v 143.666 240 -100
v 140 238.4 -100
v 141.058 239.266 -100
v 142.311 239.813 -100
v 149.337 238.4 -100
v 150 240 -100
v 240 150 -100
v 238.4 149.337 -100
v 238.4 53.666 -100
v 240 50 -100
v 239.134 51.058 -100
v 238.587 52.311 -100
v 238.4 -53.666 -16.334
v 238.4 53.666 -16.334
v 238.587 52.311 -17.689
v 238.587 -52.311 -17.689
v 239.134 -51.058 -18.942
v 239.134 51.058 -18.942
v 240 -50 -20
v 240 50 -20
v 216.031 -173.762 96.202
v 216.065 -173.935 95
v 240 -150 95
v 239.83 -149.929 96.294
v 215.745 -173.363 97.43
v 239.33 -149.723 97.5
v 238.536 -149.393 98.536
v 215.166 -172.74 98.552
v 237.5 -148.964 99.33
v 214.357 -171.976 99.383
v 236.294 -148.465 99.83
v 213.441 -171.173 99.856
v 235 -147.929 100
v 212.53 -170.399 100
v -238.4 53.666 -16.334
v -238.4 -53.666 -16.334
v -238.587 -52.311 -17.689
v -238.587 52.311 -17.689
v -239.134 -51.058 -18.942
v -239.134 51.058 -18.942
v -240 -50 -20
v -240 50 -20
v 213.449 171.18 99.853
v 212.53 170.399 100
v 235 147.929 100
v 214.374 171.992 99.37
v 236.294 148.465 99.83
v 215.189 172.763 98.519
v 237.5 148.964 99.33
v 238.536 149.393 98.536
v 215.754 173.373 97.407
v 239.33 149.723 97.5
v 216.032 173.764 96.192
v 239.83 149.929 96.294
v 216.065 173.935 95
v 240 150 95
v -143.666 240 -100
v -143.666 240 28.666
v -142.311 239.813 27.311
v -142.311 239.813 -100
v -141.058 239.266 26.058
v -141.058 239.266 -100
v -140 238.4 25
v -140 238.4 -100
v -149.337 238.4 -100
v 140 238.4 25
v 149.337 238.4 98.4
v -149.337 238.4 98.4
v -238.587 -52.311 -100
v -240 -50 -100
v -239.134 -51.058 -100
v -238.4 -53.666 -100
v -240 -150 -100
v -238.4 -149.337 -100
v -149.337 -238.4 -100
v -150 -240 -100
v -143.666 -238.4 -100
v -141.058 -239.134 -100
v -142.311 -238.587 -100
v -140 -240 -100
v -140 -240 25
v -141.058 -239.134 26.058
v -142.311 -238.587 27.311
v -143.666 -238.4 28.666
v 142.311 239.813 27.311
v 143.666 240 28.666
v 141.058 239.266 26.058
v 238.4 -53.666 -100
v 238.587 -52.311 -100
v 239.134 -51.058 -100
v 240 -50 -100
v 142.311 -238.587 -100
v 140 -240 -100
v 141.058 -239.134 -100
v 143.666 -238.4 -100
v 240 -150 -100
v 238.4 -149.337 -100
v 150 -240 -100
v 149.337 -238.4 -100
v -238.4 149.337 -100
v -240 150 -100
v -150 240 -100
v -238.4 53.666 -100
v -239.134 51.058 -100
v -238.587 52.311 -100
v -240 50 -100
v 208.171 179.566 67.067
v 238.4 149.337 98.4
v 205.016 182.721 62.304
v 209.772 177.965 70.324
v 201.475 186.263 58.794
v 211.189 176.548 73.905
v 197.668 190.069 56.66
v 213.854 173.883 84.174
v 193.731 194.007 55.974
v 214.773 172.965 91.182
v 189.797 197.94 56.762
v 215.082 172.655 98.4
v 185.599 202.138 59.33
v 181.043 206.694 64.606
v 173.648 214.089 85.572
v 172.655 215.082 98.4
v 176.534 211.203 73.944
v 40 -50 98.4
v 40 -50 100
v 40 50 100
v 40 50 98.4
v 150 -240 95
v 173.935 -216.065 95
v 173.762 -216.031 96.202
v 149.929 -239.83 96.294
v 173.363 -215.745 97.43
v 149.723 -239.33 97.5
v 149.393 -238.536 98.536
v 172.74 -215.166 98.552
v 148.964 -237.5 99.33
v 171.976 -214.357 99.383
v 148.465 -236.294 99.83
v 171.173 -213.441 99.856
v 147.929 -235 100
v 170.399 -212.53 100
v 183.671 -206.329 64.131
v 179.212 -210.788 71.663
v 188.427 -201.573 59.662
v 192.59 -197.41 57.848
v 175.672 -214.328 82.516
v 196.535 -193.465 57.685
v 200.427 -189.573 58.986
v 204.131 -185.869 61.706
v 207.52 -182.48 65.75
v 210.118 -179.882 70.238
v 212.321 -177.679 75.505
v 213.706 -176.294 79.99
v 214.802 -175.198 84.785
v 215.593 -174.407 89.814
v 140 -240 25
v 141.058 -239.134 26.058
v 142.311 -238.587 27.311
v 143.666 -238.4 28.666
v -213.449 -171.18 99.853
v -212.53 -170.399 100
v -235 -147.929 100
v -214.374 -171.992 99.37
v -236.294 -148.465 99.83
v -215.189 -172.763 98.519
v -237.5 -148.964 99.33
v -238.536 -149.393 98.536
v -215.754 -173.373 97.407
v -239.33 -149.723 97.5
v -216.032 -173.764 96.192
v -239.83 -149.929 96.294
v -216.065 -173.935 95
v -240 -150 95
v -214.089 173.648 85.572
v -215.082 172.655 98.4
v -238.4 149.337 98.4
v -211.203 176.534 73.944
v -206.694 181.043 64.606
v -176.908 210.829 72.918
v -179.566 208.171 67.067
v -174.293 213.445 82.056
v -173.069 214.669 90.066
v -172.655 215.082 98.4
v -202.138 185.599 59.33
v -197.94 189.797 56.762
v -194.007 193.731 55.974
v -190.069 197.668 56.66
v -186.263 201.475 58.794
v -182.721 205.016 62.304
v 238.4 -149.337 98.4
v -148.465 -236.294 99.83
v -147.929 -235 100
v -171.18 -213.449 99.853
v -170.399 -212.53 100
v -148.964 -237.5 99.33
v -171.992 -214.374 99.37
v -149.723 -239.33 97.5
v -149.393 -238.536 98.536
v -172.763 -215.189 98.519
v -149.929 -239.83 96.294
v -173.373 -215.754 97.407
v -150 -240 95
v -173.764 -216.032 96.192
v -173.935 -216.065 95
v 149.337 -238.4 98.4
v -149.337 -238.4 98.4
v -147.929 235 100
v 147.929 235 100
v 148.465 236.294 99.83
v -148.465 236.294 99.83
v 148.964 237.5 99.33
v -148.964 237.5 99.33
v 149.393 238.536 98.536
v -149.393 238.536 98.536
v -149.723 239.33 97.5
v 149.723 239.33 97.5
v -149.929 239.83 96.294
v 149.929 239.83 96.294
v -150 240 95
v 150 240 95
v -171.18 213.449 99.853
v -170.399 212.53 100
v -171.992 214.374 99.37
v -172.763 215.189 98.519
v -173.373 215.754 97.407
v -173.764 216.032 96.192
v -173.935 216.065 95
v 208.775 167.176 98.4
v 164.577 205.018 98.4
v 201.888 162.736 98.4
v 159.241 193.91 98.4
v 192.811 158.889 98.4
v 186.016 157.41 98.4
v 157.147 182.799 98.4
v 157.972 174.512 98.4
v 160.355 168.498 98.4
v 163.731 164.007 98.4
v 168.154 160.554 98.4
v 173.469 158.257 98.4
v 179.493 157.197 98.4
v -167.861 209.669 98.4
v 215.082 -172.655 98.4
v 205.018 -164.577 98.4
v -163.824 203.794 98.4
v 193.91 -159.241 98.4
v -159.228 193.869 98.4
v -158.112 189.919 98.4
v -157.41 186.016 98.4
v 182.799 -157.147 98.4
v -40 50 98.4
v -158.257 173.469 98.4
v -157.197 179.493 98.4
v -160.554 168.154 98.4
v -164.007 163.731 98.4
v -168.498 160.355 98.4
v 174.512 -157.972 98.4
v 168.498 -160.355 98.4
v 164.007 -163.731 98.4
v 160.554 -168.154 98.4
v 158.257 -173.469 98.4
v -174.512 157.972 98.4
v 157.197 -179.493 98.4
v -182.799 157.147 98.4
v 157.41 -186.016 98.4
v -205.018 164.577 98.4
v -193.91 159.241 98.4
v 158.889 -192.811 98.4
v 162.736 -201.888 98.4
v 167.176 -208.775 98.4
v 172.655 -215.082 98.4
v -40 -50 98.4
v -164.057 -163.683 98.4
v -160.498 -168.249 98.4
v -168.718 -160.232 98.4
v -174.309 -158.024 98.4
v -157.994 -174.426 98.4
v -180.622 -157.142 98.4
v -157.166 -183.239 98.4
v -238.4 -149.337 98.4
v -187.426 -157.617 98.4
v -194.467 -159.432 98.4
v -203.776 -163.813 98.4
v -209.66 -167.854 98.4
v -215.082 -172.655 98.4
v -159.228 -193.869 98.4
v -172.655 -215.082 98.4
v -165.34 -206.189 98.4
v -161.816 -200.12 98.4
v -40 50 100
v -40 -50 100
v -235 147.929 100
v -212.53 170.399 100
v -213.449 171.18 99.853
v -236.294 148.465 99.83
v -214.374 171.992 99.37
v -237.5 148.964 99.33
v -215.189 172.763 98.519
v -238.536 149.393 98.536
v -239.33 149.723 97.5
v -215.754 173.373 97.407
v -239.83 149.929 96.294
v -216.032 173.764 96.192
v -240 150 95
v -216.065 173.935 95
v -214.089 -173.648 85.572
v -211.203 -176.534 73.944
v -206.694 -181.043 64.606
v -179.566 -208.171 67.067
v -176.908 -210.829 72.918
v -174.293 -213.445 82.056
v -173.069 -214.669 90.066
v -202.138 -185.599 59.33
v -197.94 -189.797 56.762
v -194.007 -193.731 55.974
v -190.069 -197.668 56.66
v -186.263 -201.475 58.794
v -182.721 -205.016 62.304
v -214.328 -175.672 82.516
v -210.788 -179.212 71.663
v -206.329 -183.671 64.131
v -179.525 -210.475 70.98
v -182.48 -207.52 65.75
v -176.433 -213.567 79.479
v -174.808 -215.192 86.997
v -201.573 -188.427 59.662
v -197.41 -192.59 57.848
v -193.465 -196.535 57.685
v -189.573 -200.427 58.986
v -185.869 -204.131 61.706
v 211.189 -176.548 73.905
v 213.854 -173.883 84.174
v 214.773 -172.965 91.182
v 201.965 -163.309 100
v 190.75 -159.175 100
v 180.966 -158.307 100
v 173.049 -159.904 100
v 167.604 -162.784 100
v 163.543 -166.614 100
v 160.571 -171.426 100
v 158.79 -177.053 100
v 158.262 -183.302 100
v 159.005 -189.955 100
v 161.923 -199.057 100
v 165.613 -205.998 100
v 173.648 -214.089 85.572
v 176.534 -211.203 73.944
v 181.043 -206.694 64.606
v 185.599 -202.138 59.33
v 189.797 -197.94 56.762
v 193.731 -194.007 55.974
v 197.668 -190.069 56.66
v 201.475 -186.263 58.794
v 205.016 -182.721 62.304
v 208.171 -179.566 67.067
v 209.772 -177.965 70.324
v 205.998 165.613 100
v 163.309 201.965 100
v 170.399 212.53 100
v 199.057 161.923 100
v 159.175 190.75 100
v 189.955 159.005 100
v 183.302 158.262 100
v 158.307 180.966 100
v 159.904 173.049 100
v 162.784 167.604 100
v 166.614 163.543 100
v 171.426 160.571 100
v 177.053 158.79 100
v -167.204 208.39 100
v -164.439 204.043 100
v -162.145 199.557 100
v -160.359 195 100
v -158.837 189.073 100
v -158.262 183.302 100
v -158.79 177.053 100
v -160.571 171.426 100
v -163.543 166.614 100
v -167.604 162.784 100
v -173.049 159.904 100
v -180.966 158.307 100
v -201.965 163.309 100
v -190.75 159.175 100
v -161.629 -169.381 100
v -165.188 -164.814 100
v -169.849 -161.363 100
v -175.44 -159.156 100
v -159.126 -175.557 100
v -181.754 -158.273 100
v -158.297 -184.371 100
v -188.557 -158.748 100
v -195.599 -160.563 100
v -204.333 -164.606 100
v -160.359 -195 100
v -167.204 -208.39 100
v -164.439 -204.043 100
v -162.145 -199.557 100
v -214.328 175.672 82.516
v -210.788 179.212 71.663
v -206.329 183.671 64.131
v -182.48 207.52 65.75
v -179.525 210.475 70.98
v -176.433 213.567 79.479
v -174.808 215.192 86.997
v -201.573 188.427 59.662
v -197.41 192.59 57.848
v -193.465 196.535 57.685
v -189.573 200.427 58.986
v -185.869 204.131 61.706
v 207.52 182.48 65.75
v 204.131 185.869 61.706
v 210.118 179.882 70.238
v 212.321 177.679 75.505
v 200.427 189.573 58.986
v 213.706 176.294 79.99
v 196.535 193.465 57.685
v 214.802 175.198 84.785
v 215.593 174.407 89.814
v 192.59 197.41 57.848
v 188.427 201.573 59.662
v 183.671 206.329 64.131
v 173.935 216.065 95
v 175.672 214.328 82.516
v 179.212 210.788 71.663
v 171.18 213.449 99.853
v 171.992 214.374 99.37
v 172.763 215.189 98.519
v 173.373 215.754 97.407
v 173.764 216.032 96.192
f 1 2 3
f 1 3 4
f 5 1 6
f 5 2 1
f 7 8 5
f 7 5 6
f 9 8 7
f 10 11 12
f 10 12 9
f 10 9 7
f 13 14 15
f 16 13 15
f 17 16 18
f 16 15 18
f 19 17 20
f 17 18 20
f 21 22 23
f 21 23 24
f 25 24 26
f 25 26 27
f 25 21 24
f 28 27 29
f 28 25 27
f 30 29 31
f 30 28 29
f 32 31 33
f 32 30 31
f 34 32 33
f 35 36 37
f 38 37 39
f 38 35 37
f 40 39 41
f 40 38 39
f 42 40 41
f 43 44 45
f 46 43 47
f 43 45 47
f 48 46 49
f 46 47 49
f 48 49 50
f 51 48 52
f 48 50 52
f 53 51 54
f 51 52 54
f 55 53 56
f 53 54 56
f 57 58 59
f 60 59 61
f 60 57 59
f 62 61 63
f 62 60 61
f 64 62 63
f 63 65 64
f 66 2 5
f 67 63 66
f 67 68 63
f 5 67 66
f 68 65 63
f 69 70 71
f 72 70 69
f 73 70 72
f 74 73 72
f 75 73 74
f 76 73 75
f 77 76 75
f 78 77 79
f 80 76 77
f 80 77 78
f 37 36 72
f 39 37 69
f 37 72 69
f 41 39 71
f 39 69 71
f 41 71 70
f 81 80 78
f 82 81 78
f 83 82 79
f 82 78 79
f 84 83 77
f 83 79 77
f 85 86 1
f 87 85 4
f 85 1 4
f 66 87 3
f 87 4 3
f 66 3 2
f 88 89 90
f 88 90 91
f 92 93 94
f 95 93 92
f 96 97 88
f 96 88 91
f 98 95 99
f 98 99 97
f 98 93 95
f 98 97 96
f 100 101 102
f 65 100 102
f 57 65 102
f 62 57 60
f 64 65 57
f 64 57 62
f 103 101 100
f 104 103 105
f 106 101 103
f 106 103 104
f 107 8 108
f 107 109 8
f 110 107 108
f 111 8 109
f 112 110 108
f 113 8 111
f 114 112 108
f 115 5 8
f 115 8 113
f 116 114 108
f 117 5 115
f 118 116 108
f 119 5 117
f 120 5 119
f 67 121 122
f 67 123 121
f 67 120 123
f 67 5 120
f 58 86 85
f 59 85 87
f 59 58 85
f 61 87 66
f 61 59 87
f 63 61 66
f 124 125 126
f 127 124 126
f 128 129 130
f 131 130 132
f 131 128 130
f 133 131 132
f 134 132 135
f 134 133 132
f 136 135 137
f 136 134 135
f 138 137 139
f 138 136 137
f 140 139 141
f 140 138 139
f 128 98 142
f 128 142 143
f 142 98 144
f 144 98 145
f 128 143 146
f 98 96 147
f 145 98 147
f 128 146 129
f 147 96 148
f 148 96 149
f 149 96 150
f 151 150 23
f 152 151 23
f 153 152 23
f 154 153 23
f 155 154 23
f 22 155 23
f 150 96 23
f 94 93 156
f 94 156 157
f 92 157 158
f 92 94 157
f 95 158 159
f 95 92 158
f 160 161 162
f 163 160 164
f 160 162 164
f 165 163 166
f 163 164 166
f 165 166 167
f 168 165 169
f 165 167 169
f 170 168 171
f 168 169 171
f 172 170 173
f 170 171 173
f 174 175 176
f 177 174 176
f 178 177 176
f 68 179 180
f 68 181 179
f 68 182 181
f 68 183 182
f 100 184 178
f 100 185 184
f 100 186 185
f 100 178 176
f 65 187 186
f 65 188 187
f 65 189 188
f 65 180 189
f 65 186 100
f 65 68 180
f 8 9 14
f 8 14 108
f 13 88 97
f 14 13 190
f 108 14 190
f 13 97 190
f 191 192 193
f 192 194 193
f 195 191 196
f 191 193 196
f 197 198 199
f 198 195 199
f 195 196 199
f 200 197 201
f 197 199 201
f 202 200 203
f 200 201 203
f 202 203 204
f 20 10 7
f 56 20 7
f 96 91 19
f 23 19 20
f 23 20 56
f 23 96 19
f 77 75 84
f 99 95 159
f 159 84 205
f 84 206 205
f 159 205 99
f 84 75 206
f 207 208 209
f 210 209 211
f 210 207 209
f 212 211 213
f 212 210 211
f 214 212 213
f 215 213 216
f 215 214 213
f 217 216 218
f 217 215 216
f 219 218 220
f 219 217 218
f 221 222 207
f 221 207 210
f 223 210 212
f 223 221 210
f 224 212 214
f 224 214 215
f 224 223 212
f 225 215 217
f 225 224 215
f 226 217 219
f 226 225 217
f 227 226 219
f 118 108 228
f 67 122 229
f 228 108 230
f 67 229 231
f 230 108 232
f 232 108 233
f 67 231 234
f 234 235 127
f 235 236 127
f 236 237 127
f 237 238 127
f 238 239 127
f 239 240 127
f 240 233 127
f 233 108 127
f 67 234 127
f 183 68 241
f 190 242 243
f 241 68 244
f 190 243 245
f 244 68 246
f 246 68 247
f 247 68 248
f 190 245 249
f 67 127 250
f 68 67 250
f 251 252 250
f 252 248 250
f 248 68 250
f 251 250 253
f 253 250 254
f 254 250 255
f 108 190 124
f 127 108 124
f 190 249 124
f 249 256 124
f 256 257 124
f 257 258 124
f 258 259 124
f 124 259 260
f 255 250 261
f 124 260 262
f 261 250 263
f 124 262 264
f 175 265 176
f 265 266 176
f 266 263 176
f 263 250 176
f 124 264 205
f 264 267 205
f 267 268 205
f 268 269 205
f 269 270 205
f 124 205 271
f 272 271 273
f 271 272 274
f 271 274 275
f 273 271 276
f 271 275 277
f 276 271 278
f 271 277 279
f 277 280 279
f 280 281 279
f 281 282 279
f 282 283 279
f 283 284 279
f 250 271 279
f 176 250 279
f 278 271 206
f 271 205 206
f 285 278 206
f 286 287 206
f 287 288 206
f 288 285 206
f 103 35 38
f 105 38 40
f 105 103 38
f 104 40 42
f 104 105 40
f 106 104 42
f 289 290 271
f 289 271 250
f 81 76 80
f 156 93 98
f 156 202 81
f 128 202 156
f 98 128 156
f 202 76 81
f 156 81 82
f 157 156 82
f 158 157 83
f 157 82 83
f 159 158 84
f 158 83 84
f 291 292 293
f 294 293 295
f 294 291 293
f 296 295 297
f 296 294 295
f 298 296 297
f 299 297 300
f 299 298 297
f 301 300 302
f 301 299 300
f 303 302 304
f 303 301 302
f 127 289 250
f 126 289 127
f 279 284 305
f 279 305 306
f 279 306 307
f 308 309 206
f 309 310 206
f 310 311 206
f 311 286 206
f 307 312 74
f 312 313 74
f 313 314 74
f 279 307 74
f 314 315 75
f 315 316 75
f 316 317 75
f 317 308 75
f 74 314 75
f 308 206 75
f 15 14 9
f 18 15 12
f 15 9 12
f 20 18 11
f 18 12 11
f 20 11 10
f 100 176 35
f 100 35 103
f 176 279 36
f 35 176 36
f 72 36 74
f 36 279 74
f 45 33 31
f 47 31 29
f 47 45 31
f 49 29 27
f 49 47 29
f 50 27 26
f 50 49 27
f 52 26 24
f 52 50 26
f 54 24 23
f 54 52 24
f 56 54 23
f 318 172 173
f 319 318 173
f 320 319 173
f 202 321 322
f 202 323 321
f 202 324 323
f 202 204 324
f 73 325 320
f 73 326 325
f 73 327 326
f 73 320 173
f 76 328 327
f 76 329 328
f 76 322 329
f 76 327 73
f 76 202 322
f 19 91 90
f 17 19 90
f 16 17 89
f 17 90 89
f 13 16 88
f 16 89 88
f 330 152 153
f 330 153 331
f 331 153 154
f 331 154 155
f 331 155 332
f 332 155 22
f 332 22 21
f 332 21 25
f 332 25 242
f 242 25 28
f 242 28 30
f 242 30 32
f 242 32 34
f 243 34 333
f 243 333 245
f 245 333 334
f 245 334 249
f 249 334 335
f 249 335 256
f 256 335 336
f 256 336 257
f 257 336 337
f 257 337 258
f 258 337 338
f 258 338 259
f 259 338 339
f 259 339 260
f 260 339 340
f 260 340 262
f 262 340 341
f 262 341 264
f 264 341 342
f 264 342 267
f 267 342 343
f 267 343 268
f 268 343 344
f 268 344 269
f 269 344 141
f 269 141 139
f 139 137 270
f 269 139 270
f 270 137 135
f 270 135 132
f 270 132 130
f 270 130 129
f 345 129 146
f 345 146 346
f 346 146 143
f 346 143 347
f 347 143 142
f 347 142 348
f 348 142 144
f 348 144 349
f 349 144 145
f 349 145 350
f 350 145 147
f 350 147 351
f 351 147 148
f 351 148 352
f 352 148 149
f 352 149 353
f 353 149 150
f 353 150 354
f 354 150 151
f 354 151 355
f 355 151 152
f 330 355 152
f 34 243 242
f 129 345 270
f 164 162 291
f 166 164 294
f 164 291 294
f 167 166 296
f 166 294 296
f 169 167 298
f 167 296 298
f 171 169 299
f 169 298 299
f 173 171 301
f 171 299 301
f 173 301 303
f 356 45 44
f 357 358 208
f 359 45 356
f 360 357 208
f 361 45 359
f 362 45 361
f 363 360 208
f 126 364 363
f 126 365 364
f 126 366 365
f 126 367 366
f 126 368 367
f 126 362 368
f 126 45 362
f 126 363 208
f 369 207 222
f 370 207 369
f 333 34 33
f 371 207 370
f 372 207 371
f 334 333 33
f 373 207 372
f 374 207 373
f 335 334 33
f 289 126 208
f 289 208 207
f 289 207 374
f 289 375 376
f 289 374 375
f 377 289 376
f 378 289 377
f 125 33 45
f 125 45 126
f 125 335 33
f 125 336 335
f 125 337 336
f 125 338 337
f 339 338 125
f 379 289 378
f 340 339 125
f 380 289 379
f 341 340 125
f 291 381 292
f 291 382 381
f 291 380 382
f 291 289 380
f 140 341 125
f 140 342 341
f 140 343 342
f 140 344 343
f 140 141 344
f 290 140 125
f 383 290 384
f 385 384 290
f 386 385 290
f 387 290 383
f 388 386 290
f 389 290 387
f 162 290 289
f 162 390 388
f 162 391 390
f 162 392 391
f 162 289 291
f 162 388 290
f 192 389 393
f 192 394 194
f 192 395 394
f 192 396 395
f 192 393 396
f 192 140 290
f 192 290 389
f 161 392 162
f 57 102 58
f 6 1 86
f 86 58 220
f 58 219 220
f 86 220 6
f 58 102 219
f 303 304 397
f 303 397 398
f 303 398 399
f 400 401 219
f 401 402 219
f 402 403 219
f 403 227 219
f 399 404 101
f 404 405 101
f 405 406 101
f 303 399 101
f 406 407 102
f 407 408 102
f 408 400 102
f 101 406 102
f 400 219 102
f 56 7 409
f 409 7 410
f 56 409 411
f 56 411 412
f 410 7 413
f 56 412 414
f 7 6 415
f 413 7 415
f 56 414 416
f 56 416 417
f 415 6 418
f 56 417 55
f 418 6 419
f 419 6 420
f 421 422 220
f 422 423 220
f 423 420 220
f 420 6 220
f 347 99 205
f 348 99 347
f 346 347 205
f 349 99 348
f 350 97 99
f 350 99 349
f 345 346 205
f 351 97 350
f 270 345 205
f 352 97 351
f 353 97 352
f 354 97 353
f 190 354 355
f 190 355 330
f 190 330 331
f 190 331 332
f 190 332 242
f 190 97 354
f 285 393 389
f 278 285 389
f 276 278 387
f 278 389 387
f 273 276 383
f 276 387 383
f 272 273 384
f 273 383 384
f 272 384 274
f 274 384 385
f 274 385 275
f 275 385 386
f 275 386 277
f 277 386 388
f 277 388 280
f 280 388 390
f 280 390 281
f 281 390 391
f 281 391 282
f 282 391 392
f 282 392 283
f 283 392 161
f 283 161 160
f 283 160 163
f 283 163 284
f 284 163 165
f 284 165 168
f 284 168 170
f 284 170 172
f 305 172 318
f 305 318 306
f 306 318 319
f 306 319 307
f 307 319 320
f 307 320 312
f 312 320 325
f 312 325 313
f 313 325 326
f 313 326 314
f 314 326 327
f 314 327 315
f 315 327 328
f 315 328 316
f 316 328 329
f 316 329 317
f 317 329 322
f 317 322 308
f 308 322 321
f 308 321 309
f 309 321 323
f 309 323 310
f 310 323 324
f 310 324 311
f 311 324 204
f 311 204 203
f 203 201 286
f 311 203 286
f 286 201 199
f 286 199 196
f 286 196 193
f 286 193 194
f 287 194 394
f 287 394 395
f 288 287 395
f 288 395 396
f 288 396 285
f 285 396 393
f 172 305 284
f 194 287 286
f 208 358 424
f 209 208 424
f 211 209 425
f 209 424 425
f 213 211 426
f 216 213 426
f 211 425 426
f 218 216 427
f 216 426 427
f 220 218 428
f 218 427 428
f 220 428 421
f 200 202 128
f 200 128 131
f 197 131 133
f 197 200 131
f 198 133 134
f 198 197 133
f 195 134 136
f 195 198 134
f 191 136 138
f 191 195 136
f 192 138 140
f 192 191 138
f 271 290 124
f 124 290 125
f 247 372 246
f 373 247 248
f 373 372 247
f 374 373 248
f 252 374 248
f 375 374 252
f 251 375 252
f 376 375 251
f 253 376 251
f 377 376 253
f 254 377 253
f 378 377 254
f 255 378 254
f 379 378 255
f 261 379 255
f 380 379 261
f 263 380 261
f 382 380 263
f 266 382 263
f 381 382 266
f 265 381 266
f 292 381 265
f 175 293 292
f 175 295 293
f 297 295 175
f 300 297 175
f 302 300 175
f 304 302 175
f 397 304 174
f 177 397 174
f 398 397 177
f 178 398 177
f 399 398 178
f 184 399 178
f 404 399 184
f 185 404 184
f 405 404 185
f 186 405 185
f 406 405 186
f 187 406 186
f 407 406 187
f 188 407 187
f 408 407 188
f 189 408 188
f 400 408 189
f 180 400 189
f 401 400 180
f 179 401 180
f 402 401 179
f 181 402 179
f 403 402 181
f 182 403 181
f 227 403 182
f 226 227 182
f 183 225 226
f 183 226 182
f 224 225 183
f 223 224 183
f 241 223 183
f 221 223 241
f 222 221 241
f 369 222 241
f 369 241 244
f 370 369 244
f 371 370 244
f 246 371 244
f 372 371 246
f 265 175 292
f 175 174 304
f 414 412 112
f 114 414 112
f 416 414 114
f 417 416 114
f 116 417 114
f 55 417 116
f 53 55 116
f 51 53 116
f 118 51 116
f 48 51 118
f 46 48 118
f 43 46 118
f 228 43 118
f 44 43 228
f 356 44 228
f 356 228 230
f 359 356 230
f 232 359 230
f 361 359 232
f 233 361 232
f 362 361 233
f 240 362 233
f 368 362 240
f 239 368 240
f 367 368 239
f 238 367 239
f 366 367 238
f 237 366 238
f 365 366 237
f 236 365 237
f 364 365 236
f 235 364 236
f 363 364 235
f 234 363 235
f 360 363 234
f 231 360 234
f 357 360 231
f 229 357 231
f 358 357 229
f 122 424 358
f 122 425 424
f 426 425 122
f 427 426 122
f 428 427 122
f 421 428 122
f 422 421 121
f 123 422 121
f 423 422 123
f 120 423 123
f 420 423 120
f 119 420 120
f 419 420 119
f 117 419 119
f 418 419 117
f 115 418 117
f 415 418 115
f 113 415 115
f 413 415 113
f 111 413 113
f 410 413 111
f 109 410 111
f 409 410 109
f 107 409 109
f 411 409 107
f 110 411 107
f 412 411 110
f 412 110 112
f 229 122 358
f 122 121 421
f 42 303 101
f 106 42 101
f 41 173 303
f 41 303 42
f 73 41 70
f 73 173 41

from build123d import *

# Parameters (mm, degrees)
F1_DEPTH       = 240
F2_SIZE        = 90
F3_T           = -1.6
F10_R          = 30
F12_DEPTH      = 78
F11_R          = 30
F13_DEPTH      = 82
F8_R           = 30
F14_DEPTH      = 153
F9_R           = 30
F15_DEPTH      = 141
F17_DEPTH      = 688
F18_W          = 80
F18_H          = 100
F19_DEPTH      = 25
F20_T1_DEPTH   = 325
F20_T3_DEPTH   = 58.6396103068
F20_T5_DEPTH   = 58.6396103068
F20_T7_DEPTH   = 58.6396103068
F20_T9_DEPTH   = 58.6396103068
F20_T11_DEPTH  = 325
F20_T13_DEPTH  = 58.6396103068
F20_T15_DEPTH  = 58.6396103068
F20_T17_DEPTH  = 134.1651513899
F20_T19_DEPTH  = 280
F20_T21_DEPTH  = 89.1651513899
F20_T23_DEPTH  = 100
F20_T29_DEPTH  = 134.1651513899
F20_T33_DEPTH  = 289.1651513899
F20_T40_DEPTH  = 289.1651513899
F20_T44_DEPTH  = 134.1651513899
F20_T51_DEPTH  = 89.1651513899
F20_T55_DEPTH  = 109.1651513899
F20_T62_DEPTH  = 109.1651513899
F20_T66_DEPTH  = 89.1651513899
F20_T73_DEPTH  = 89.1651513899
F20_T77_DEPTH  = 109.1651513899
F20_T84_DEPTH  = 89.1651513899
F20_T88_DEPTH  = 109.1651513899
F20_T95_DEPTH  = 289.1651513899
F20_T99_DEPTH  = 134.1651513899
F20_T106_DEPTH = 134.1651513899
F20_T110_DEPTH = 289.1651513899


# Not quite as in the source:
# - a fillet or chamfer that OpenCascade refuses, or shapes differently, is made with other operations: its cross-section is extruded or revolved along the edge and cut away or added


with BuildPart() as f1:
    # F0 (on Front) → F1 (new body, symmetric)
    with BuildSketch(Plane.XZ):
        Polygon((140, -100), (240, -100), (240, 100), (-240, 100), (-240, -100), (-140, -100), (-140, 25), (140, 25), align=None)
    extrude(amount=F1_DEPTH, both=True)

    # F2
    f2_edges = [f1.edges().sort_by_distance(p)[0] for p in [
        (240, -240, 0),
        (240, 240, 0),
        (-240, 240, 0),
        (-240, -240, 0),
    ]]
    chamfer(f2_edges, length=F2_SIZE)

    # F3
    f3_openings = [f1.faces().sort_by_distance(p)[0] for p in [
        (185.93985, 0, -100),
        (-185.93985, 0, -100),
        (0, 0, 25),
        (140, 0, -37.5),
        (-140, 0, -37.5),
    ]]
    offset(amount=F3_T, openings=f3_openings)

    # F10 (on face) → F12 (cut)
    with BuildSketch(Plane(origin=(-132.8553390593, 132.8553390593, 187.8858223314), x_dir=(0.8660254038, 0.2886751346, 0.4082482905), z_dir=(0.5, -0.5, -0.7071067812))):
        with Locations((-71.7584734456, -101.4818063619)):
            Circle(F10_R)
    extrude(amount=F12_DEPTH, mode=Mode.SUBTRACT)

    # F11 (on face) → F13 (cut)
    with BuildSketch(Plane(origin=(-132.8553390593, -132.8553390593, 187.8858223314), x_dir=(0.8660254038, -0.2886751346, 0.4082482905), z_dir=(-0.5, -0.5, 0.7071067812))):
        with Locations((-71.7584734456, -101.4818063619)):
            Circle(F11_R)
    extrude(amount=-F13_DEPTH, mode=Mode.SUBTRACT)

    # F8 (on face) → F14 (cut)
    with BuildSketch(Plane(origin=(132.8553390593, -132.8553390593, 187.8858223314), x_dir=(0.8660254038, 0.2886751346, -0.4082482905), z_dir=(0.5, -0.5, 0.7071067812))):
        with Locations((71.7584734456, -101.4818063619)):
            Circle(F8_R)
    extrude(amount=-F14_DEPTH, mode=Mode.SUBTRACT)

    # F9 (on face) → F15 (cut)
    with BuildSketch(Plane(origin=(132.8553390593, 132.8553390593, 187.8858223314), x_dir=(0.8660254038, -0.2886751346, -0.4082482905), z_dir=(-0.5, -0.5, -0.7071067812))):
        with Locations((71.7584734456, -101.4818063619)):
            Circle(F9_R)
    extrude(amount=F15_DEPTH, mode=Mode.SUBTRACT)

    # F16 (on face) → F17 (cut)
    with BuildSketch(Plane(origin=(-240, 0, 0), x_dir=(0, -1, 0), z_dir=(-1, 0, 0))):
        Polygon((-50, -20), (-50, -100), (0, -100), (50, -100), (50, -20), align=None)
    extrude(amount=-F17_DEPTH, mode=Mode.SUBTRACT)

    # F18 (on face) → F19 (cut)
    with BuildSketch(Plane.XY.offset(100)):
        Rectangle(F18_W, F18_H)
    extrude(amount=-F19_DEPTH, mode=Mode.SUBTRACT)

    # F20: fillet of radius 5 on 24 edges, made by hand

    # F20_s2 → F20_t1 (cut)
    with BuildSketch(Plane.YZ.offset(-162.5)):
        with BuildLine():
            ThreePointArc((235, 100), (238.5355339059, 98.5355339059), (240, 95))
            Line((240, 95), (240, 100))
            Line((240, 100), (235, 100))
        make_face()
        with BuildLine():
            ThreePointArc((-240, 95), (-238.5355339059, 98.5355339059), (-235, 100))
            Line((-235, 100), (-240, 100))
            Line((-240, 100), (-240, 95))
        make_face()
    extrude(amount=F20_T1_DEPTH, mode=Mode.SUBTRACT)

    # F20_s4 → F20_t3 (cut)
    with BuildSketch(Plane(origin=(12.3743686708, 12.3743686708, 0), x_dir=(0, 0, 1), z_dir=(0.7071067812, 0.7071067812, 0))):
        with BuildLine():
            ThreePointArc((100, -270.7716446628), (98.5355339059, -274.3071785687), (95, -275.7716446628))
            Line((95, -275.7716446628), (100, -275.7716446628))
            Line((100, -275.7716446628), (100, -270.7716446628))
        make_face()
        with BuildLine():
            ThreePointArc((95, 275.7716446628), (98.5355339059, 274.3071785687), (100, 270.7716446628))
            Line((100, 270.7716446628), (100, 275.7716446628))
            Line((100, 275.7716446628), (95, 275.7716446628))
        make_face()
    extrude(amount=F20_T3_DEPTH, mode=Mode.SUBTRACT)

    # F20_s6 → F20_t5 (cut)
    with BuildSketch(Plane(origin=(-12.3743686708, 12.3743686708, 0), x_dir=(0, 0, 1), z_dir=(-0.7071067812, 0.7071067812, 0))):
        with BuildLine():
            ThreePointArc((100, 270.7716446628), (98.5355339059, 274.3071785687), (95, 275.7716446628))
            Line((95, 275.7716446628), (100, 275.7716446628))
            Line((100, 275.7716446628), (100, 270.7716446628))
        make_face()
    extrude(amount=F20_T5_DEPTH, mode=Mode.SUBTRACT)

    # F20_s8 → F20_t7 (cut)
    with BuildSketch(Plane(origin=(53.8388347648, -53.8388347648, 0), x_dir=(0, 0, 1), z_dir=(-0.7071067812, 0.7071067812, 0))):
        with BuildLine():
            ThreePointArc((100, 270.7716446628), (98.5355339059, 274.3071785687), (95, 275.7716446628))
            Line((95, 275.7716446628), (100, 275.7716446628))
            Line((100, 275.7716446628), (100, 270.7716446628))
        make_face()
    extrude(amount=F20_T7_DEPTH, mode=Mode.SUBTRACT)

    # F20_s10 → F20_t9 (cut)
    with BuildSketch(Plane(origin=(-53.8388347648, -53.8388347648, 0), x_dir=(0, 0, 1), z_dir=(0.7071067812, 0.7071067812, 0))):
        with BuildLine():
            ThreePointArc((100, -270.7716446628), (98.5355339059, -274.3071785687), (95, -275.7716446628))
            Line((95, -275.7716446628), (100, -275.7716446628))
            Line((100, -275.7716446628), (100, -270.7716446628))
        make_face()
        with BuildLine():
            ThreePointArc((95, 275.7716446628), (98.5355339059, 274.3071785687), (100, 270.7716446628))
            Line((100, 270.7716446628), (100, 275.7716446628))
            Line((100, 275.7716446628), (95, 275.7716446628))
        make_face()
    extrude(amount=F20_T9_DEPTH, mode=Mode.SUBTRACT)

    # F20_s12 → F20_t11 (cut)
    with BuildSketch(Plane.XZ.offset(-162.5)):
        with BuildLine():
            ThreePointArc((-235, 100), (-238.5355339059, 98.5355339059), (-240, 95))
            Line((-240, 95), (-240, 100))
            Line((-240, 100), (-235, 100))
        make_face()
        with BuildLine():
            ThreePointArc((235, 100), (238.5355339059, 98.5355339059), (240, 95))
            Line((240, 95), (240, 100))
            Line((240, 100), (235, 100))
        make_face()
    extrude(amount=F20_T11_DEPTH, mode=Mode.SUBTRACT)

    # F20_s14 → F20_t13 (cut)
    with BuildSketch(Plane(origin=(-53.8388347648, 53.8388347648, 0), x_dir=(0, 0, 1), z_dir=(0.7071067812, -0.7071067812, 0))):
        with BuildLine():
            ThreePointArc((100, 270.7716446628), (98.5355339059, 274.3071785687), (95, 275.7716446628))
            Line((95, 275.7716446628), (100, 275.7716446628))
            Line((100, 275.7716446628), (100, 270.7716446628))
        make_face()
    extrude(amount=F20_T13_DEPTH, mode=Mode.SUBTRACT)

    # F20_s16 → F20_t15 (cut)
    with BuildSketch(Plane(origin=(12.3743686708, -12.3743686708, 0), x_dir=(0, 0, 1), z_dir=(0.7071067812, -0.7071067812, 0))):
        with BuildLine():
            ThreePointArc((100, 270.7716446628), (98.5355339059, 274.3071785687), (95, 275.7716446628))
            Line((95, 275.7716446628), (100, 275.7716446628))
            Line((100, 275.7716446628), (100, 270.7716446628))
        make_face()
    extrude(amount=F20_T15_DEPTH, mode=Mode.SUBTRACT)

    # F20_s18 → F20_t17 (cut)
    with BuildSketch(Plane.XY.offset(-109.1651513899)):
        with BuildLine():
            ThreePointArc((140, -240), (141.666060556, -238.817424305), (143.666060556, -238.4))
            Line((143.666060556, -238.4), (140, -238.4))
            Line((140, -238.4), (140, -240))
        make_face()
        with BuildLine():
            ThreePointArc((-140, -240), (-141.666060556, -238.817424305), (-143.666060556, -238.4))
            Line((-143.666060556, -238.4), (-140, -238.4))
            Line((-140, -238.4), (-140, -240))
        make_face()
        with BuildLine():
            ThreePointArc((143.666060556, 240), (141.666060556, 239.582575695), (140, 238.4))
            Line((140, 238.4), (140, 240))
            Line((140, 240), (143.666060556, 240))
        make_face()
        with BuildLine():
            ThreePointArc((-143.666060556, 240), (-141.666060556, 239.582575695), (-140, 238.4))
            Line((-140, 238.4), (-140, 240))
            Line((-140, 240), (-143.666060556, 240))
        make_face()
    extrude(amount=F20_T17_DEPTH, mode=Mode.SUBTRACT)

    # F20_s20 → F20_t19 (cut)
    with BuildSketch(Plane.YZ.offset(-140)):
        with BuildLine():
            ThreePointArc((-240, 25), (-238.817424305, 26.666060556), (-238.4, 28.666060556))
            Line((-238.4, 28.666060556), (-238.4, 25))
            Line((-238.4, 25), (-240, 25))
        make_face()
        with BuildLine():
            ThreePointArc((240, 28.666060556), (239.582575695, 26.666060556), (238.4, 25))
            Line((238.4, 25), (240, 25))
            Line((240, 25), (240, 28.666060556))
        make_face()
    extrude(amount=F20_T19_DEPTH, mode=Mode.SUBTRACT)

    # F20_s22 → F20_t21 (cut)
    with BuildSketch(Plane.XY.offset(-109.1651513899)):
        with BuildLine():
            ThreePointArc((-238.4, -53.666060556), (-238.817424305, -51.666060556), (-240, -50))
            Line((-240, -50), (-238.4, -50))
            Line((-238.4, -50), (-238.4, -53.666060556))
        make_face()
        with BuildLine():
            ThreePointArc((-238.4, 53.666060556), (-238.817424305, 51.666060556), (-240, 50))
            Line((-240, 50), (-238.4, 50))
            Line((-238.4, 50), (-238.4, 53.666060556))
        make_face()
        with BuildLine():
            ThreePointArc((240, -50), (238.817424305, -51.666060556), (238.4, -53.666060556))
            Line((238.4, -53.666060556), (238.4, -50))
            Line((238.4, -50), (240, -50))
        make_face()
        with BuildLine():
            ThreePointArc((238.4, 53.666060556), (238.817424305, 51.666060556), (240, 50))
            Line((240, 50), (238.4, 50))
            Line((238.4, 50), (238.4, 53.666060556))
        make_face()
    extrude(amount=F20_T21_DEPTH, mode=Mode.SUBTRACT)

    # F20_s24 → F20_t23 (cut)
    with BuildSketch(Plane.XZ.offset(-50)):
        with BuildLine():
            ThreePointArc((-238.4, -16.333939444), (-238.817424305, -18.333939444), (-240, -20))
            Line((-240, -20), (-238.4, -20))
            Line((-238.4, -20), (-238.4, -16.333939444))
        make_face()
        with BuildLine():
            ThreePointArc((238.4, -16.333939444), (238.817424305, -18.333939444), (240, -20))
            Line((240, -20), (238.4, -20))
            Line((238.4, -20), (238.4, -16.333939444))
        make_face()
    extrude(amount=F20_T23_DEPTH, mode=Mode.SUBTRACT)


with BuildPart() as f20_tool27:
    # F20_s28 → F20_t29 (new body)
    with BuildSketch(Plane.XY.offset(34.1651513899)):
        with BuildLine():
            ThreePointArc((140, -240), (141.666060556, -238.817424305), (143.666060556, -238.4))
            Line((143.666060556, -238.4), (140, -238.4))
            Line((140, -238.4), (140, -240))
        make_face()
    extrude(amount=-F20_T29_DEPTH)

    split(bisect_by=Plane.XY.offset(25), keep=Keep.TOP)


with BuildPart() as f20_tool31:
    # F20_s32 → F20_t33 (new body)
    with BuildSketch(Plane.YZ.offset(-140)):
        with BuildLine():
            ThreePointArc((-240, 25), (-238.817424305, 26.666060556), (-238.4, 28.666060556))
            Line((-238.4, 28.666060556), (-238.4, 25))
            Line((-238.4, 25), (-240, 25))
        make_face()
    extrude(amount=F20_T33_DEPTH)

    split(bisect_by=Plane.YZ.offset(140), keep=Keep.TOP)


with BuildPart() as f20_tool27_1:
    add(f20_tool27.part)

    # F20_t35: intersect F20_tool31
    add(f20_tool31.part, mode=Mode.INTERSECT)


with BuildPart() as f1_1:
    add(f1.part)

    # F20_t25: cut F20_tool27
    add(f20_tool27_1.part, mode=Mode.SUBTRACT)


with BuildPart() as f20_tool38:
    # F20_s39 → F20_t40 (new body)
    with BuildSketch(Plane.YZ.offset(-149.1651513899)):
        with BuildLine():
            ThreePointArc((-240, 25), (-238.817424305, 26.666060556), (-238.4, 28.666060556))
            Line((-238.4, 28.666060556), (-238.4, 25))
            Line((-238.4, 25), (-240, 25))
        make_face()
    extrude(amount=F20_T40_DEPTH)

    split(bisect_by=Plane.YZ.offset(-140), keep=Keep.BOTTOM)


with BuildPart() as f20_tool42:
    # F20_s43 → F20_t44 (new body)
    with BuildSketch(Plane.XY.offset(-100)):
        with BuildLine():
            ThreePointArc((-140, -240), (-141.666060556, -238.817424305), (-143.666060556, -238.4))
            Line((-143.666060556, -238.4), (-140, -238.4))
            Line((-140, -238.4), (-140, -240))
        make_face()
    extrude(amount=F20_T44_DEPTH)

    split(bisect_by=Plane.XY.offset(25), keep=Keep.TOP)


with BuildPart() as f20_tool38_1:
    add(f20_tool38.part)

    # F20_t46: intersect F20_tool42
    add(f20_tool42.part, mode=Mode.INTERSECT)


with BuildPart() as f1_2:
    add(f1_1.part)

    # F20_t36: cut F20_tool38
    add(f20_tool38_1.part, mode=Mode.SUBTRACT)


with BuildPart() as f20_tool49:
    # F20_s50 → F20_t51 (new body)
    with BuildSketch(Plane.XY.offset(-100)):
        with BuildLine():
            ThreePointArc((-238.4, -53.666060556), (-238.817424305, -51.666060556), (-240, -50))
            Line((-240, -50), (-238.4, -50))
            Line((-238.4, -50), (-238.4, -53.666060556))
        make_face()
    extrude(amount=F20_T51_DEPTH)

    split(bisect_by=Plane.XY.offset(-20), keep=Keep.TOP)


with BuildPart() as f20_tool53:
    # F20_s54 → F20_t55 (new body)
    with BuildSketch(Plane.XZ.offset(59.1651513899)):
        with BuildLine():
            ThreePointArc((-238.4, -16.333939444), (-238.817424305, -18.333939444), (-240, -20))
            Line((-240, -20), (-238.4, -20))
            Line((-238.4, -20), (-238.4, -16.333939444))
        make_face()
    extrude(amount=-F20_T55_DEPTH)

    split(bisect_by=Plane.XZ.offset(50), keep=Keep.TOP)


with BuildPart() as f20_tool49_1:
    add(f20_tool49.part)

    # F20_t57: intersect F20_tool53
    add(f20_tool53.part, mode=Mode.INTERSECT)


with BuildPart() as f1_3:
    add(f1_2.part)

    # F20_t47: cut F20_tool49
    add(f20_tool49_1.part, mode=Mode.SUBTRACT)


with BuildPart() as f20_tool60:
    # F20_s61 → F20_t62 (new body)
    with BuildSketch(Plane.XZ.offset(50)):
        with BuildLine():
            ThreePointArc((-238.4, -16.333939444), (-238.817424305, -18.333939444), (-240, -20))
            Line((-240, -20), (-238.4, -20))
            Line((-238.4, -20), (-238.4, -16.333939444))
        make_face()
    extrude(amount=-F20_T62_DEPTH)

    split(bisect_by=Plane.XZ.offset(-50), keep=Keep.BOTTOM)


with BuildPart() as f20_tool64:
    # F20_s65 → F20_t66 (new body)
    with BuildSketch(Plane.XY.offset(-10.8348486101)):
        with BuildLine():
            ThreePointArc((-238.4, 53.666060556), (-238.817424305, 51.666060556), (-240, 50))
            Line((-240, 50), (-238.4, 50))
            Line((-238.4, 50), (-238.4, 53.666060556))
        make_face()
    extrude(amount=-F20_T66_DEPTH)

    split(bisect_by=Plane.XY.offset(-20), keep=Keep.TOP)


with BuildPart() as f20_tool60_1:
    add(f20_tool60.part)

    # F20_t68: intersect F20_tool64
    add(f20_tool64.part, mode=Mode.INTERSECT)


with BuildPart() as f1_4:
    add(f1_3.part)

    # F20_t58: cut F20_tool60
    add(f20_tool60_1.part, mode=Mode.SUBTRACT)


with BuildPart() as f20_tool71:
    # F20_s72 → F20_t73 (new body)
    with BuildSketch(Plane.XY.offset(-10.8348486101)):
        with BuildLine():
            ThreePointArc((240, -50), (238.817424305, -51.666060556), (238.4, -53.666060556))
            Line((238.4, -53.666060556), (238.4, -50))
            Line((238.4, -50), (240, -50))
        make_face()
    extrude(amount=-F20_T73_DEPTH)

    split(bisect_by=Plane.XY.offset(-20), keep=Keep.TOP)


with BuildPart() as f20_tool75:
    # F20_s76 → F20_t77 (new body)
    with BuildSketch(Plane.XZ.offset(-50)):
        with BuildLine():
            ThreePointArc((238.4, -16.333939444), (238.817424305, -18.333939444), (240, -20))
            Line((240, -20), (238.4, -20))
            Line((238.4, -20), (238.4, -16.333939444))
        make_face()
    extrude(amount=F20_T77_DEPTH)

    split(bisect_by=Plane.XZ.offset(50), keep=Keep.TOP)


with BuildPart() as f20_tool71_1:
    add(f20_tool71.part)

    # F20_t79: intersect F20_tool75
    add(f20_tool75.part, mode=Mode.INTERSECT)


with BuildPart() as f1_5:
    add(f1_4.part)

    # F20_t69: cut F20_tool71
    add(f20_tool71_1.part, mode=Mode.SUBTRACT)


with BuildPart() as f20_tool82:
    # F20_s83 → F20_t84 (new body)
    with BuildSketch(Plane.XY.offset(-100)):
        with BuildLine():
            ThreePointArc((238.4, 53.666060556), (238.817424305, 51.666060556), (240, 50))
            Line((240, 50), (238.4, 50))
            Line((238.4, 50), (238.4, 53.666060556))
        make_face()
    extrude(amount=F20_T84_DEPTH)

    split(bisect_by=Plane.XY.offset(-20), keep=Keep.TOP)


with BuildPart() as f20_tool86:
    # F20_s87 → F20_t88 (new body)
    with BuildSketch(Plane.XZ.offset(-59.1651513899)):
        with BuildLine():
            ThreePointArc((238.4, -16.333939444), (238.817424305, -18.333939444), (240, -20))
            Line((240, -20), (238.4, -20))
            Line((238.4, -20), (238.4, -16.333939444))
        make_face()
    extrude(amount=F20_T88_DEPTH)

    split(bisect_by=Plane.XZ.offset(-50), keep=Keep.BOTTOM)


with BuildPart() as f20_tool82_1:
    add(f20_tool82.part)

    # F20_t90: intersect F20_tool86
    add(f20_tool86.part, mode=Mode.INTERSECT)


with BuildPart() as f1_6:
    add(f1_5.part)

    # F20_t80: cut F20_tool82
    add(f20_tool82_1.part, mode=Mode.SUBTRACT)


with BuildPart() as f20_tool93:
    # F20_s94 → F20_t95 (new body)
    with BuildSketch(Plane.YZ.offset(-149.1651513899)):
        with BuildLine():
            ThreePointArc((240, 28.666060556), (239.582575695, 26.666060556), (238.4, 25))
            Line((238.4, 25), (240, 25))
            Line((240, 25), (240, 28.666060556))
        make_face()
    extrude(amount=F20_T95_DEPTH)

    split(bisect_by=Plane.YZ.offset(-140), keep=Keep.BOTTOM)


with BuildPart() as f20_tool97:
    # F20_s98 → F20_t99 (new body)
    with BuildSketch(Plane.XY.offset(-100)):
        with BuildLine():
            ThreePointArc((-143.666060556, 240), (-141.666060556, 239.582575695), (-140, 238.4))
            Line((-140, 238.4), (-140, 240))
            Line((-140, 240), (-143.666060556, 240))
        make_face()
    extrude(amount=F20_T99_DEPTH)

    split(bisect_by=Plane.XY.offset(25), keep=Keep.TOP)


with BuildPart() as f20_tool93_1:
    add(f20_tool93.part)

    # F20_t101: intersect F20_tool97
    add(f20_tool97.part, mode=Mode.INTERSECT)


with BuildPart() as f1_7:
    add(f1_6.part)

    # F20_t91: cut F20_tool93
    add(f20_tool93_1.part, mode=Mode.SUBTRACT)


with BuildPart() as f20_tool104:
    # F20_s105 → F20_t106 (new body)
    with BuildSketch(Plane.XY.offset(34.1651513899)):
        with BuildLine():
            ThreePointArc((143.666060556, 240), (141.666060556, 239.582575695), (140, 238.4))
            Line((140, 238.4), (140, 240))
            Line((140, 240), (143.666060556, 240))
        make_face()
    extrude(amount=-F20_T106_DEPTH)

    split(bisect_by=Plane.XY.offset(25), keep=Keep.TOP)


with BuildPart() as f20_tool108:
    # F20_s109 → F20_t110 (new body)
    with BuildSketch(Plane.YZ.offset(-140)):
        with BuildLine():
            ThreePointArc((240, 28.666060556), (239.582575695, 26.666060556), (238.4, 25))
            Line((238.4, 25), (240, 25))
            Line((240, 25), (240, 28.666060556))
        make_face()
    extrude(amount=F20_T110_DEPTH)

    split(bisect_by=Plane.YZ.offset(140), keep=Keep.TOP)


with BuildPart() as f20_tool104_1:
    add(f20_tool104.part)

    # F20_t112: intersect F20_tool108
    add(f20_tool108.part, mode=Mode.INTERSECT)


with BuildPart() as f1_8:
    add(f1_7.part)

    # F20_t102: cut F20_tool104
    add(f20_tool104_1.part, mode=Mode.SUBTRACT)


solid = f1_8.part
